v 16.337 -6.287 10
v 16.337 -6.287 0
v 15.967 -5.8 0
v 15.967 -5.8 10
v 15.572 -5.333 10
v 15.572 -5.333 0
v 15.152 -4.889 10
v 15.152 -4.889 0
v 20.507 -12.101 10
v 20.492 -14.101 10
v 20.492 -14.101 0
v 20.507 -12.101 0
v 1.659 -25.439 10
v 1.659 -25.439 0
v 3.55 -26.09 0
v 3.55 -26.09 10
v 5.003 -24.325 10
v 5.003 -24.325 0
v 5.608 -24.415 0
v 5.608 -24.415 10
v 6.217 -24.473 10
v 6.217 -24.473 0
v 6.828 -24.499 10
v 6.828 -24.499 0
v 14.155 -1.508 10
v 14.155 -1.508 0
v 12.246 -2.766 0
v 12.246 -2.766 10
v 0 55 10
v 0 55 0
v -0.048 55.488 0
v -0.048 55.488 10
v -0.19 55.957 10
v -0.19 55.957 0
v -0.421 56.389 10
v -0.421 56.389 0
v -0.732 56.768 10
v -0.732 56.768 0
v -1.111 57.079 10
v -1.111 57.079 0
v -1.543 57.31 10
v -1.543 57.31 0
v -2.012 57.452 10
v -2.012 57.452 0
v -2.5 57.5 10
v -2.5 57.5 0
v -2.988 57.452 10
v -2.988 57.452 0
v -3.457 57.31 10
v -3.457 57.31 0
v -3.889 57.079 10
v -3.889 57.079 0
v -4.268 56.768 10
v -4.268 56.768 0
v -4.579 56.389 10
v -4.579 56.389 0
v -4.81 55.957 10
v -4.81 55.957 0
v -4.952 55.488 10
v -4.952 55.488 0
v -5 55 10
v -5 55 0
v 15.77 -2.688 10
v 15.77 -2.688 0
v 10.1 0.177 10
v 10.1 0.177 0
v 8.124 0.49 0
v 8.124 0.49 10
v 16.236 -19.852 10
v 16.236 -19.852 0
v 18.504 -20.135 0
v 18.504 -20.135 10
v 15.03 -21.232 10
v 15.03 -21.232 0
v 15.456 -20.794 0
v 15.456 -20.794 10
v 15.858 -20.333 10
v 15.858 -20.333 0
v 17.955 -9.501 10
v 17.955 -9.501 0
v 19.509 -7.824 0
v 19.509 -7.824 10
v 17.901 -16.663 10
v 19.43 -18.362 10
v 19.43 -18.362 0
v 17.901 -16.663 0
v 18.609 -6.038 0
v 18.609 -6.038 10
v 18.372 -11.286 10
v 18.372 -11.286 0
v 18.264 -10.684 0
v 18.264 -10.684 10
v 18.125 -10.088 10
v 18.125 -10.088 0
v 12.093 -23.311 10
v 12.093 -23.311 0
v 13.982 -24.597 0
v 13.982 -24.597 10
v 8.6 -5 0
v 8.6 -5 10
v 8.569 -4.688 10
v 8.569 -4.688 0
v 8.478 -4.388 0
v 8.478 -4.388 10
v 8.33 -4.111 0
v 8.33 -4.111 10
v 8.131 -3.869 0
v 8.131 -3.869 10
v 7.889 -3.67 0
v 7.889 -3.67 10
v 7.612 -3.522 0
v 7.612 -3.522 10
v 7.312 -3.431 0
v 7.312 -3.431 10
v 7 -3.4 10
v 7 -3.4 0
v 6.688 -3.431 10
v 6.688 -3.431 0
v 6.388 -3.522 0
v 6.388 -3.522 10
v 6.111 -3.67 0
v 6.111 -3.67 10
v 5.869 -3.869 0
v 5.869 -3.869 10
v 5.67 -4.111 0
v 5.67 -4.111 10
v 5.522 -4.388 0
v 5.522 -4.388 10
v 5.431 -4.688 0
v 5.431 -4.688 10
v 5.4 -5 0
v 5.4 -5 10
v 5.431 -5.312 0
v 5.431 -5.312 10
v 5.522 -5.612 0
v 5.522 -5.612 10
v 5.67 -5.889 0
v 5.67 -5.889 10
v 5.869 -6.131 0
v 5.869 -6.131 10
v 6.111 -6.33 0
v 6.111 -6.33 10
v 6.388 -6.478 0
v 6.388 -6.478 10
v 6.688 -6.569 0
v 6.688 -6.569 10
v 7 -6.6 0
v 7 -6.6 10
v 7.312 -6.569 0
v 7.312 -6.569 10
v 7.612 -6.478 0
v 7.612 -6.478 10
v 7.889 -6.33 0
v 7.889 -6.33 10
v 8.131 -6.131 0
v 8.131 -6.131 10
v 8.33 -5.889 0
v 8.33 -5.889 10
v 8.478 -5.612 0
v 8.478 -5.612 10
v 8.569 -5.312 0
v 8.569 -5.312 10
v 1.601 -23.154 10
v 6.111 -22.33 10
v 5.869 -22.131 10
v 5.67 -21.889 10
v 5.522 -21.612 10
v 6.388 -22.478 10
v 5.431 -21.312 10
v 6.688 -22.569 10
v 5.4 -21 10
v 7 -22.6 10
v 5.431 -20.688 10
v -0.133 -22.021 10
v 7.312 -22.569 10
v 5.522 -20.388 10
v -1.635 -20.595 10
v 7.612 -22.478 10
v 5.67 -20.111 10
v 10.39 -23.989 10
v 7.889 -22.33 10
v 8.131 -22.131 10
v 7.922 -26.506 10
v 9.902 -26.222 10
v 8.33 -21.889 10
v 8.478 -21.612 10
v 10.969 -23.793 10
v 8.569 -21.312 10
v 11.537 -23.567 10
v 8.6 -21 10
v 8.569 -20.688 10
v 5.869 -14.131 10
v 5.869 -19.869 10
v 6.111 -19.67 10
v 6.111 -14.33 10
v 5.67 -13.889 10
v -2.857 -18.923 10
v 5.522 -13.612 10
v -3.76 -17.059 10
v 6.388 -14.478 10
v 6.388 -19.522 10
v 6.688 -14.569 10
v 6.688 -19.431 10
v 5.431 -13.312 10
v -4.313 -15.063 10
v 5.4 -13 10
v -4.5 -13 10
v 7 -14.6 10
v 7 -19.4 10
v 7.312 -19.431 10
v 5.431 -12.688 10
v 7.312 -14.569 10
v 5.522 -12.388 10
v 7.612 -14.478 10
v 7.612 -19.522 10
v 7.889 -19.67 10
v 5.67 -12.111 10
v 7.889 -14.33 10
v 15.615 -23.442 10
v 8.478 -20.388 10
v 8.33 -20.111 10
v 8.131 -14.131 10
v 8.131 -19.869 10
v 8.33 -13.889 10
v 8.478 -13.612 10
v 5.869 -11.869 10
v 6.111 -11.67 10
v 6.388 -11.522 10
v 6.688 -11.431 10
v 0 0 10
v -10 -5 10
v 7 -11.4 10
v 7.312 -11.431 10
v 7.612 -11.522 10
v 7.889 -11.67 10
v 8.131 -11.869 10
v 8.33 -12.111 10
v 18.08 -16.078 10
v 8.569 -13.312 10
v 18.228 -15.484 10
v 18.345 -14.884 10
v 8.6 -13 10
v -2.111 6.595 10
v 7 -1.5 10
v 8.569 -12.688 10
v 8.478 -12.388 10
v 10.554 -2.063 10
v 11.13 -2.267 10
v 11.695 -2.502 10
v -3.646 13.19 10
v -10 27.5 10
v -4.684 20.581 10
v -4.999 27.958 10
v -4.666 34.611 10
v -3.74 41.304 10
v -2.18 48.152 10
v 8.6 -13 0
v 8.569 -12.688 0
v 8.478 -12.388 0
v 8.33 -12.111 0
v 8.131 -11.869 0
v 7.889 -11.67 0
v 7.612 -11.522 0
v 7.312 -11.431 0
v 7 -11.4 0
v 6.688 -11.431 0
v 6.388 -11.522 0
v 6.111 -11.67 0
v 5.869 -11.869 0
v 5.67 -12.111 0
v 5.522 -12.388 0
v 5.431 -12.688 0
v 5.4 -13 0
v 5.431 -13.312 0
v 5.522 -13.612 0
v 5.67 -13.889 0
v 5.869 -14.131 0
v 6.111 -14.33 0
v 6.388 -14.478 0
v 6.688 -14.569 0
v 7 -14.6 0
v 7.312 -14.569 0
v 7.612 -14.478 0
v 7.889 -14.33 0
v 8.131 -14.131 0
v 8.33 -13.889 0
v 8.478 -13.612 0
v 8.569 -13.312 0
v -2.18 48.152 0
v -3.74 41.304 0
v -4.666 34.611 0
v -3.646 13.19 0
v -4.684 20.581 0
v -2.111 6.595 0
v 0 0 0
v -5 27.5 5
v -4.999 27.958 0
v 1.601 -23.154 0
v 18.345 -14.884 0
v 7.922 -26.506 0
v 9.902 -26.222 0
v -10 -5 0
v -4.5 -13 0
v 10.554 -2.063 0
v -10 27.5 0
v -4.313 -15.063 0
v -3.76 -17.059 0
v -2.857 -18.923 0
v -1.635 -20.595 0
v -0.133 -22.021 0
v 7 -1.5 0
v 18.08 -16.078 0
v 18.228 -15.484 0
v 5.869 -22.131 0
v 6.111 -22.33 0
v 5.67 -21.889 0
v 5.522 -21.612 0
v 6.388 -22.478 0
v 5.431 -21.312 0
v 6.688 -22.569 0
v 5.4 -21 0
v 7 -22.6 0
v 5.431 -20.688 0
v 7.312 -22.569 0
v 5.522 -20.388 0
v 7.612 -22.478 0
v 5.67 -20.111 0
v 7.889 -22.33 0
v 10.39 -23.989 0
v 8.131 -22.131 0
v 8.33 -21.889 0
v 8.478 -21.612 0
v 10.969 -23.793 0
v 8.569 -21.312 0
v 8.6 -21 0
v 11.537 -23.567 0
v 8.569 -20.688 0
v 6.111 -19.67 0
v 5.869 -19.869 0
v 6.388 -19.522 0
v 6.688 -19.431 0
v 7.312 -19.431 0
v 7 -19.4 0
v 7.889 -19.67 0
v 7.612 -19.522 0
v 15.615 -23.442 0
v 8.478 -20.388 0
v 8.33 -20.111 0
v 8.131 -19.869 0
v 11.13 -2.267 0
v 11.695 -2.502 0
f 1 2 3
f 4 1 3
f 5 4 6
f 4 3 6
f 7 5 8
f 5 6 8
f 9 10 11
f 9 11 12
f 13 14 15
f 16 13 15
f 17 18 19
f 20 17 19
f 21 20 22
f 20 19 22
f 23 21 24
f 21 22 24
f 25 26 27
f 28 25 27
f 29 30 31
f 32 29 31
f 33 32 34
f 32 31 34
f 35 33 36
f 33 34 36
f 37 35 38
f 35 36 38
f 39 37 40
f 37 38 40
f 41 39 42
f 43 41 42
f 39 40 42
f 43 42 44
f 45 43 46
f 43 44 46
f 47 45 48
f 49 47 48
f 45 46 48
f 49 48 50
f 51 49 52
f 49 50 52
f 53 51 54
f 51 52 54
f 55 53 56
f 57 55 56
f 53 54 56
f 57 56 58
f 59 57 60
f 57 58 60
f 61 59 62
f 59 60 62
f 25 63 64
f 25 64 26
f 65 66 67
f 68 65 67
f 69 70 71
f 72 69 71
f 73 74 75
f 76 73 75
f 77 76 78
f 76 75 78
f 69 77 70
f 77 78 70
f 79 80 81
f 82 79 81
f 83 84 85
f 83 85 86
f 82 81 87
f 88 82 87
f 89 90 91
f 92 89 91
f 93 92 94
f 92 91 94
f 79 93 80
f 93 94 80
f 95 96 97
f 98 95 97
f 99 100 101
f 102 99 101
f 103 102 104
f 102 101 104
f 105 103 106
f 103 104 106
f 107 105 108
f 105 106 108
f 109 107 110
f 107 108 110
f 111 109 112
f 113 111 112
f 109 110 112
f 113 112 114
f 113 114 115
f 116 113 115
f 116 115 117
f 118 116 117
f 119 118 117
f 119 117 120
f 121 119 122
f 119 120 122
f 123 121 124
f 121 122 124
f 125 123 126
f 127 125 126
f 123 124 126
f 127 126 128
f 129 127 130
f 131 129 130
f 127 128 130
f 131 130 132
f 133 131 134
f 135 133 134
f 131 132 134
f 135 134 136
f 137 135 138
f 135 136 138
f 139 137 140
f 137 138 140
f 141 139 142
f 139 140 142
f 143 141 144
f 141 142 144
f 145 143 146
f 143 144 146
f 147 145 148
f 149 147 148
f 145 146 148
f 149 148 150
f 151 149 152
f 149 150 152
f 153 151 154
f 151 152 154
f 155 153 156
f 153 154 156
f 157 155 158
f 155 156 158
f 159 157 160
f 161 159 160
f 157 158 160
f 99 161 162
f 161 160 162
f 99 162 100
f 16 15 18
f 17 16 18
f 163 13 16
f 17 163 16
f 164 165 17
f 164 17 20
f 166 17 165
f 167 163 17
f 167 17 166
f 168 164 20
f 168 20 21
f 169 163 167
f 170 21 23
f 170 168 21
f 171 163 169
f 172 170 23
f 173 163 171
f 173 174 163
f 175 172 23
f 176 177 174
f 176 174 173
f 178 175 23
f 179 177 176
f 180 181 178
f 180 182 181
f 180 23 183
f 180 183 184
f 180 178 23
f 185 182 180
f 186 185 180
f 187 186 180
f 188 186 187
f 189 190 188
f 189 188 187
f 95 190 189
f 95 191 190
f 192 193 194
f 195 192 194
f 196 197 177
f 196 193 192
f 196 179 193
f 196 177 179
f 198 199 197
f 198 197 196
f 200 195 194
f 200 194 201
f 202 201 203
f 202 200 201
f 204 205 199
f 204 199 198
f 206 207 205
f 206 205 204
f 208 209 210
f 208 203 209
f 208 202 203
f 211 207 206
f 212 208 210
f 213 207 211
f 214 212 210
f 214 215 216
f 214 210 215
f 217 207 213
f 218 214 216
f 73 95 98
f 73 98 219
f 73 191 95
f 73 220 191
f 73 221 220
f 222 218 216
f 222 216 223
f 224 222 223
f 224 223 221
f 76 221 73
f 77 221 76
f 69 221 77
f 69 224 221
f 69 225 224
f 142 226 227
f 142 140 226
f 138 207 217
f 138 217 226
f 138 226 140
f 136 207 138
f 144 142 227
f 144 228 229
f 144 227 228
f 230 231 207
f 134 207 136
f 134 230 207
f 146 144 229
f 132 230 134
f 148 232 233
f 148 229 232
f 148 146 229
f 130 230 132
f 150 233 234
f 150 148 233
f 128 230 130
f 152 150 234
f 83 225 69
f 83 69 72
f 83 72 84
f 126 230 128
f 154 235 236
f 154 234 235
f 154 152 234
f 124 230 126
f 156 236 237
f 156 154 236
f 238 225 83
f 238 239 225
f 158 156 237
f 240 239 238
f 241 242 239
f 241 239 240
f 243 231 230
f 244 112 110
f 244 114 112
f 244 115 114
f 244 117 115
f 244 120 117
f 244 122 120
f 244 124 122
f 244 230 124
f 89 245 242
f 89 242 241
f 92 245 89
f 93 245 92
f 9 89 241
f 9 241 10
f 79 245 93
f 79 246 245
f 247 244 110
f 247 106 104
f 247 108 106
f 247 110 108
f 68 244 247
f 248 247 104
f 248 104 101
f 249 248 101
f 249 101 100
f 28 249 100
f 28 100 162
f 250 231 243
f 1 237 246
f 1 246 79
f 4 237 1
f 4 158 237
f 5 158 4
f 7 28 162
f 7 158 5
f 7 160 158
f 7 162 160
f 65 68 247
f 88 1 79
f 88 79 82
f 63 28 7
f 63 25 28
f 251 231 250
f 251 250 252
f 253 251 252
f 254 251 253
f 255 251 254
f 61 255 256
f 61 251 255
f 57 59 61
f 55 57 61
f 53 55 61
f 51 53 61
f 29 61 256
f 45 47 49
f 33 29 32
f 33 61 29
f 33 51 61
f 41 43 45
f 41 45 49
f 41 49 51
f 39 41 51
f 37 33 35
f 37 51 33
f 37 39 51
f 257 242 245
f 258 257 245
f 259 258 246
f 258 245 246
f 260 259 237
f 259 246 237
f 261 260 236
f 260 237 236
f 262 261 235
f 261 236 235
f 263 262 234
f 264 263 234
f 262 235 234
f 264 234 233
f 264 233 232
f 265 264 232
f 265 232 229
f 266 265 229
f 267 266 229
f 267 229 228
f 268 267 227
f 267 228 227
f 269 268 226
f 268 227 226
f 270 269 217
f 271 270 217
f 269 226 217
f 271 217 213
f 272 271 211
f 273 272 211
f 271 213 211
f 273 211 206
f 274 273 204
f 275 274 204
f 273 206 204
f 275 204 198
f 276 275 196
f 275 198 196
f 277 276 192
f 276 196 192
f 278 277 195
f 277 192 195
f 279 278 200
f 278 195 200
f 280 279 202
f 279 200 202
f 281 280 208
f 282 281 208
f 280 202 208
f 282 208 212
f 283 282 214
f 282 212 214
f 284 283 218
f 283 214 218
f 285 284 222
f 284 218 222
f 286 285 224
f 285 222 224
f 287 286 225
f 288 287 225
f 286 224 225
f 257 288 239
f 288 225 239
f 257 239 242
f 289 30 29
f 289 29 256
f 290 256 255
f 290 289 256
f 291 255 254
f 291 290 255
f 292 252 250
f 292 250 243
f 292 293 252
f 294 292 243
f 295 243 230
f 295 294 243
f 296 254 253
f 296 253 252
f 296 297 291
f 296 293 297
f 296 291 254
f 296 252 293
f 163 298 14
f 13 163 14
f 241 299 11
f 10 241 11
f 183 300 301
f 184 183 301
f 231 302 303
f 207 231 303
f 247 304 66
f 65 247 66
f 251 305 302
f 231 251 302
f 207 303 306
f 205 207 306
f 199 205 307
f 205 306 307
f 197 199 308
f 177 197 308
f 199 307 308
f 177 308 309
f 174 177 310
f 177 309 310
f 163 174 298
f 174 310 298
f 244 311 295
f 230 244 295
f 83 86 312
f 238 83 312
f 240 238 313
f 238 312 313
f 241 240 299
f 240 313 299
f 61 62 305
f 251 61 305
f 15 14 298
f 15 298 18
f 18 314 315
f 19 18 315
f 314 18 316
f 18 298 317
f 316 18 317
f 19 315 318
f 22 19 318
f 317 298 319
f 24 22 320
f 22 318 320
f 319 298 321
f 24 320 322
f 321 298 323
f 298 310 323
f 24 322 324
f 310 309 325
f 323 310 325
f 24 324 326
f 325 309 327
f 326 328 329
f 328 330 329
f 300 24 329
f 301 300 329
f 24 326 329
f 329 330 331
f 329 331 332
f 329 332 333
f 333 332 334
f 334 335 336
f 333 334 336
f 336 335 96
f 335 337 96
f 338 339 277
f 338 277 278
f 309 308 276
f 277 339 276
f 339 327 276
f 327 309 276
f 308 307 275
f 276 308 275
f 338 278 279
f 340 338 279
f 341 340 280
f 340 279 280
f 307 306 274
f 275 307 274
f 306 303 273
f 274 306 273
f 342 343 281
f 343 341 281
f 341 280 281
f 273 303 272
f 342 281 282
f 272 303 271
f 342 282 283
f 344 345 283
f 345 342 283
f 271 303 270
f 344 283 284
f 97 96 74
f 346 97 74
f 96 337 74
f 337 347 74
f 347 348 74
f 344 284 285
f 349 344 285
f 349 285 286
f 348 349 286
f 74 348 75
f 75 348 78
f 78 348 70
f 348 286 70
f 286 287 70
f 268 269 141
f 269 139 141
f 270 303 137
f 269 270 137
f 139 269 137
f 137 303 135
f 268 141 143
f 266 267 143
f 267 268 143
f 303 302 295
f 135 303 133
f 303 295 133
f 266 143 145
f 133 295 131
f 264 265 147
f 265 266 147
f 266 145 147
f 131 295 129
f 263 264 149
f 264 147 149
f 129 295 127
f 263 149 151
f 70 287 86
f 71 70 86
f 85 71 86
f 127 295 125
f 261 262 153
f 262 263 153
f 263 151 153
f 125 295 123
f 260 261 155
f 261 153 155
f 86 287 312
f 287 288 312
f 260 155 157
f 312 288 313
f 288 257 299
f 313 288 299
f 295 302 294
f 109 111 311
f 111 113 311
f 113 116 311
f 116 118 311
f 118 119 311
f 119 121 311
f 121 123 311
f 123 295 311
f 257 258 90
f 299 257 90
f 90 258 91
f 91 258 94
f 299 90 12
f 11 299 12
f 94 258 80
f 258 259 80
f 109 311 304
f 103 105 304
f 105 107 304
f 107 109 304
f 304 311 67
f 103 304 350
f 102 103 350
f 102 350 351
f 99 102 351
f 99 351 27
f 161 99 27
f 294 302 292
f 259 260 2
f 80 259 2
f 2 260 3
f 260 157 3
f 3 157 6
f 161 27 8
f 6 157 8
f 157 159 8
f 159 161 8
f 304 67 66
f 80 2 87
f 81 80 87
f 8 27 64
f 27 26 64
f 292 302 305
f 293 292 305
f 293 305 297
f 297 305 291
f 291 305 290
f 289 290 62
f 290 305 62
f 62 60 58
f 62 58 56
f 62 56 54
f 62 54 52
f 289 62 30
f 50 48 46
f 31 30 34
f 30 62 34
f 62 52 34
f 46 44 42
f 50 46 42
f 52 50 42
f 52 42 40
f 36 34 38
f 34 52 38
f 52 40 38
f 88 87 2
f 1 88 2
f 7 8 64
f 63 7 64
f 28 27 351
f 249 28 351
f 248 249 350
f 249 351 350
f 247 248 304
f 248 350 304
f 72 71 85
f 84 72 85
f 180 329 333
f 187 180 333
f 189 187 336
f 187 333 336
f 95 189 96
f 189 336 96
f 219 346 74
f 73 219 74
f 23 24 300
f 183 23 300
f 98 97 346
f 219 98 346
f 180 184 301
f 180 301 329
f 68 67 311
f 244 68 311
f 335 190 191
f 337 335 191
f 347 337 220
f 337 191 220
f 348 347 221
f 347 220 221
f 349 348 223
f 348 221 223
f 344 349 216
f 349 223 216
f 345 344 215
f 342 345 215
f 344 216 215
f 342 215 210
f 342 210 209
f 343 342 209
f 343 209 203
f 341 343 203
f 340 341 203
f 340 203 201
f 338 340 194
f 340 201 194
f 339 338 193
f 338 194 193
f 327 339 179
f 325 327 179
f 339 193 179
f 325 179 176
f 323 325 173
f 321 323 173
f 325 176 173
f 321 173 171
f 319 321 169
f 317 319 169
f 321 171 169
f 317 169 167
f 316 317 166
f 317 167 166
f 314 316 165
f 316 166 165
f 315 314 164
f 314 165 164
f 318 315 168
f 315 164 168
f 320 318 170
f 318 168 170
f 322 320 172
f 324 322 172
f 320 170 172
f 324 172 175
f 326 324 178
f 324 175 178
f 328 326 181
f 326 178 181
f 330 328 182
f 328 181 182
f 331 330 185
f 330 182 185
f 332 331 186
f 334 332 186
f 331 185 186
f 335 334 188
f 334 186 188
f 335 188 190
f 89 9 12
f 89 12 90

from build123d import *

# Parameters (mm, degrees)
SKETCH_1_R          = 11.5
EXTRUDE_1_DEPTH     = 10
SKETCH_2_R          = 1.6
CUT_EXTRUDE_1_DEPTH = 10


with BuildPart() as part:
    # 草圖1 → 填料-伸長1 (new body)
    with BuildSketch(Plane.XY):
        with BuildLine():
            ThreePointArc((0, 55), (-2.5, 57.5), (-5, 55))
            Line((-5, 55), (-10, 27.5))
            Line((-10, 27.5), (-10, -5))
            Line((-10, -5), (-4.5, -13))
            ThreePointArc((-4.5, -13), (-1.131727984, -4.868272016), (7, -1.5))
            Line((7, -1.5), (0, 0))
            add(Edge.make_bspline(
                [(0, 55), (-10, 27.5), (0, 0)],
                knots=[0, 0, 0, 1, 1, 1], degree=2))
        make_face()
        with Locations((7, -13)):
            Circle(SKETCH_1_R)
        with BuildLine():
            Line((8.124176937, 0.490227063), (7, -1.5))
            ThreePointArc((7, -1.5), (8.798996348, -1.641584083), (10.553695435, -2.062850063))
            Line((10.553695435, -2.062850063), (10.099553619, 0.177358133))
            Line((10.099553619, 0.177358133), (8.124176937, 0.490227063))
        make_face()
        with BuildLine():
            Line((14.154758721, -1.508288742), (12.24642256, -2.766474199))
            ThreePointArc((12.24642256, -2.766474199), (13.782706526, -3.713187189), (15.151977747, -4.888572333))
            Line((15.151977747, -4.888572333), (15.769856601, -2.687889877))
            Line((15.769856601, -2.687889877), (14.154758721, -1.508288742))
        make_face()
        with BuildLine():
            Line((18.609459232, -6.037927296), (16.337287066, -6.286947769))
            ThreePointArc((16.337287066, -6.286947769), (17.272482302, -7.830270089), (17.954734932, -9.500888316))
            Line((17.954734932, -9.500888316), (19.508542695, -7.824445957))
            Line((19.508542695, -7.824445957), (18.609459232, -6.037927296))
        make_face()
        with BuildLine():
            Line((20.507102251, -12.101006797), (18.371554502, -11.286013939))
            ThreePointArc((18.371554502, -11.286013939), (18.467843668, -12.140603924), (18.5, -13))
            ThreePointArc((18.5, -13), (18.461094648, -13.945150505), (18.34464183, -14.883905981))
            Line((18.34464183, -14.883905981), (20.492142426, -14.100950847))
            Line((20.492142426, -14.100950847), (20.507102251, -12.101006797))
        make_face()
        with BuildLine():
            ThreePointArc((17.901164481, -16.662596478), (17.193996736, -18.322821671), (16.23581896, -19.85198133))
            Line((16.23581896, -19.85198133), (18.504011675, -20.134964287))
            Line((18.504011675, -20.134964287), (19.429719792, -18.362095289))
            Line((19.429719792, -18.362095289), (17.901164481, -16.662596478))
        make_face()
        with BuildLine():
            ThreePointArc((15.029723408, -21.232468766), (13.643022341, -22.387238901), (12.092748017, -23.310864059))
            Line((12.092748017, -23.310864059), (13.98204893, -24.597456304))
            Line((13.98204893, -24.597456304), (15.614612218, -23.442148071))
            Line((15.614612218, -23.442148071), (15.029723408, -21.232468766))
        make_face()
        with BuildLine():
            ThreePointArc((10.389684506, -23.989087267), (8.628879877, -24.384056849), (6.827966819, -24.498713171))
            Line((6.827966819, -24.498713171), (7.922245347, -26.505534551))
            Line((7.922245347, -26.505534551), (9.902081321, -26.222251095))
            Line((9.902081321, -26.222251095), (10.389684506, -23.989087267))
        make_face()
        with BuildLine():
            ThreePointArc((5.003045957, -24.32528916), (3.255966224, -23.873463619), (1.601077028, -23.153897318))
            Line((1.601077028, -23.153897318), (1.659311339, -25.438932616))
            Line((1.659311339, -25.438932616), (3.55034849, -26.090068925))
            Line((3.55034849, -26.090068925), (5.003045957, -24.32528916))
        make_face()
    extrude(amount=EXTRUDE_1_DEPTH)

    # 草圖2 → 除料-伸長1 (cut)
    with BuildSketch(Plane.XY.offset(10)):
        with Locations((7, -5)):
            Circle(SKETCH_2_R)
        with Locations((7, -21)):
            Circle(SKETCH_2_R)
        with Locations((7, -13)):
            Circle(SKETCH_2_R)
    extrude(amount=-CUT_EXTRUDE_1_DEPTH, mode=Mode.SUBTRACT)


solid = part.part
